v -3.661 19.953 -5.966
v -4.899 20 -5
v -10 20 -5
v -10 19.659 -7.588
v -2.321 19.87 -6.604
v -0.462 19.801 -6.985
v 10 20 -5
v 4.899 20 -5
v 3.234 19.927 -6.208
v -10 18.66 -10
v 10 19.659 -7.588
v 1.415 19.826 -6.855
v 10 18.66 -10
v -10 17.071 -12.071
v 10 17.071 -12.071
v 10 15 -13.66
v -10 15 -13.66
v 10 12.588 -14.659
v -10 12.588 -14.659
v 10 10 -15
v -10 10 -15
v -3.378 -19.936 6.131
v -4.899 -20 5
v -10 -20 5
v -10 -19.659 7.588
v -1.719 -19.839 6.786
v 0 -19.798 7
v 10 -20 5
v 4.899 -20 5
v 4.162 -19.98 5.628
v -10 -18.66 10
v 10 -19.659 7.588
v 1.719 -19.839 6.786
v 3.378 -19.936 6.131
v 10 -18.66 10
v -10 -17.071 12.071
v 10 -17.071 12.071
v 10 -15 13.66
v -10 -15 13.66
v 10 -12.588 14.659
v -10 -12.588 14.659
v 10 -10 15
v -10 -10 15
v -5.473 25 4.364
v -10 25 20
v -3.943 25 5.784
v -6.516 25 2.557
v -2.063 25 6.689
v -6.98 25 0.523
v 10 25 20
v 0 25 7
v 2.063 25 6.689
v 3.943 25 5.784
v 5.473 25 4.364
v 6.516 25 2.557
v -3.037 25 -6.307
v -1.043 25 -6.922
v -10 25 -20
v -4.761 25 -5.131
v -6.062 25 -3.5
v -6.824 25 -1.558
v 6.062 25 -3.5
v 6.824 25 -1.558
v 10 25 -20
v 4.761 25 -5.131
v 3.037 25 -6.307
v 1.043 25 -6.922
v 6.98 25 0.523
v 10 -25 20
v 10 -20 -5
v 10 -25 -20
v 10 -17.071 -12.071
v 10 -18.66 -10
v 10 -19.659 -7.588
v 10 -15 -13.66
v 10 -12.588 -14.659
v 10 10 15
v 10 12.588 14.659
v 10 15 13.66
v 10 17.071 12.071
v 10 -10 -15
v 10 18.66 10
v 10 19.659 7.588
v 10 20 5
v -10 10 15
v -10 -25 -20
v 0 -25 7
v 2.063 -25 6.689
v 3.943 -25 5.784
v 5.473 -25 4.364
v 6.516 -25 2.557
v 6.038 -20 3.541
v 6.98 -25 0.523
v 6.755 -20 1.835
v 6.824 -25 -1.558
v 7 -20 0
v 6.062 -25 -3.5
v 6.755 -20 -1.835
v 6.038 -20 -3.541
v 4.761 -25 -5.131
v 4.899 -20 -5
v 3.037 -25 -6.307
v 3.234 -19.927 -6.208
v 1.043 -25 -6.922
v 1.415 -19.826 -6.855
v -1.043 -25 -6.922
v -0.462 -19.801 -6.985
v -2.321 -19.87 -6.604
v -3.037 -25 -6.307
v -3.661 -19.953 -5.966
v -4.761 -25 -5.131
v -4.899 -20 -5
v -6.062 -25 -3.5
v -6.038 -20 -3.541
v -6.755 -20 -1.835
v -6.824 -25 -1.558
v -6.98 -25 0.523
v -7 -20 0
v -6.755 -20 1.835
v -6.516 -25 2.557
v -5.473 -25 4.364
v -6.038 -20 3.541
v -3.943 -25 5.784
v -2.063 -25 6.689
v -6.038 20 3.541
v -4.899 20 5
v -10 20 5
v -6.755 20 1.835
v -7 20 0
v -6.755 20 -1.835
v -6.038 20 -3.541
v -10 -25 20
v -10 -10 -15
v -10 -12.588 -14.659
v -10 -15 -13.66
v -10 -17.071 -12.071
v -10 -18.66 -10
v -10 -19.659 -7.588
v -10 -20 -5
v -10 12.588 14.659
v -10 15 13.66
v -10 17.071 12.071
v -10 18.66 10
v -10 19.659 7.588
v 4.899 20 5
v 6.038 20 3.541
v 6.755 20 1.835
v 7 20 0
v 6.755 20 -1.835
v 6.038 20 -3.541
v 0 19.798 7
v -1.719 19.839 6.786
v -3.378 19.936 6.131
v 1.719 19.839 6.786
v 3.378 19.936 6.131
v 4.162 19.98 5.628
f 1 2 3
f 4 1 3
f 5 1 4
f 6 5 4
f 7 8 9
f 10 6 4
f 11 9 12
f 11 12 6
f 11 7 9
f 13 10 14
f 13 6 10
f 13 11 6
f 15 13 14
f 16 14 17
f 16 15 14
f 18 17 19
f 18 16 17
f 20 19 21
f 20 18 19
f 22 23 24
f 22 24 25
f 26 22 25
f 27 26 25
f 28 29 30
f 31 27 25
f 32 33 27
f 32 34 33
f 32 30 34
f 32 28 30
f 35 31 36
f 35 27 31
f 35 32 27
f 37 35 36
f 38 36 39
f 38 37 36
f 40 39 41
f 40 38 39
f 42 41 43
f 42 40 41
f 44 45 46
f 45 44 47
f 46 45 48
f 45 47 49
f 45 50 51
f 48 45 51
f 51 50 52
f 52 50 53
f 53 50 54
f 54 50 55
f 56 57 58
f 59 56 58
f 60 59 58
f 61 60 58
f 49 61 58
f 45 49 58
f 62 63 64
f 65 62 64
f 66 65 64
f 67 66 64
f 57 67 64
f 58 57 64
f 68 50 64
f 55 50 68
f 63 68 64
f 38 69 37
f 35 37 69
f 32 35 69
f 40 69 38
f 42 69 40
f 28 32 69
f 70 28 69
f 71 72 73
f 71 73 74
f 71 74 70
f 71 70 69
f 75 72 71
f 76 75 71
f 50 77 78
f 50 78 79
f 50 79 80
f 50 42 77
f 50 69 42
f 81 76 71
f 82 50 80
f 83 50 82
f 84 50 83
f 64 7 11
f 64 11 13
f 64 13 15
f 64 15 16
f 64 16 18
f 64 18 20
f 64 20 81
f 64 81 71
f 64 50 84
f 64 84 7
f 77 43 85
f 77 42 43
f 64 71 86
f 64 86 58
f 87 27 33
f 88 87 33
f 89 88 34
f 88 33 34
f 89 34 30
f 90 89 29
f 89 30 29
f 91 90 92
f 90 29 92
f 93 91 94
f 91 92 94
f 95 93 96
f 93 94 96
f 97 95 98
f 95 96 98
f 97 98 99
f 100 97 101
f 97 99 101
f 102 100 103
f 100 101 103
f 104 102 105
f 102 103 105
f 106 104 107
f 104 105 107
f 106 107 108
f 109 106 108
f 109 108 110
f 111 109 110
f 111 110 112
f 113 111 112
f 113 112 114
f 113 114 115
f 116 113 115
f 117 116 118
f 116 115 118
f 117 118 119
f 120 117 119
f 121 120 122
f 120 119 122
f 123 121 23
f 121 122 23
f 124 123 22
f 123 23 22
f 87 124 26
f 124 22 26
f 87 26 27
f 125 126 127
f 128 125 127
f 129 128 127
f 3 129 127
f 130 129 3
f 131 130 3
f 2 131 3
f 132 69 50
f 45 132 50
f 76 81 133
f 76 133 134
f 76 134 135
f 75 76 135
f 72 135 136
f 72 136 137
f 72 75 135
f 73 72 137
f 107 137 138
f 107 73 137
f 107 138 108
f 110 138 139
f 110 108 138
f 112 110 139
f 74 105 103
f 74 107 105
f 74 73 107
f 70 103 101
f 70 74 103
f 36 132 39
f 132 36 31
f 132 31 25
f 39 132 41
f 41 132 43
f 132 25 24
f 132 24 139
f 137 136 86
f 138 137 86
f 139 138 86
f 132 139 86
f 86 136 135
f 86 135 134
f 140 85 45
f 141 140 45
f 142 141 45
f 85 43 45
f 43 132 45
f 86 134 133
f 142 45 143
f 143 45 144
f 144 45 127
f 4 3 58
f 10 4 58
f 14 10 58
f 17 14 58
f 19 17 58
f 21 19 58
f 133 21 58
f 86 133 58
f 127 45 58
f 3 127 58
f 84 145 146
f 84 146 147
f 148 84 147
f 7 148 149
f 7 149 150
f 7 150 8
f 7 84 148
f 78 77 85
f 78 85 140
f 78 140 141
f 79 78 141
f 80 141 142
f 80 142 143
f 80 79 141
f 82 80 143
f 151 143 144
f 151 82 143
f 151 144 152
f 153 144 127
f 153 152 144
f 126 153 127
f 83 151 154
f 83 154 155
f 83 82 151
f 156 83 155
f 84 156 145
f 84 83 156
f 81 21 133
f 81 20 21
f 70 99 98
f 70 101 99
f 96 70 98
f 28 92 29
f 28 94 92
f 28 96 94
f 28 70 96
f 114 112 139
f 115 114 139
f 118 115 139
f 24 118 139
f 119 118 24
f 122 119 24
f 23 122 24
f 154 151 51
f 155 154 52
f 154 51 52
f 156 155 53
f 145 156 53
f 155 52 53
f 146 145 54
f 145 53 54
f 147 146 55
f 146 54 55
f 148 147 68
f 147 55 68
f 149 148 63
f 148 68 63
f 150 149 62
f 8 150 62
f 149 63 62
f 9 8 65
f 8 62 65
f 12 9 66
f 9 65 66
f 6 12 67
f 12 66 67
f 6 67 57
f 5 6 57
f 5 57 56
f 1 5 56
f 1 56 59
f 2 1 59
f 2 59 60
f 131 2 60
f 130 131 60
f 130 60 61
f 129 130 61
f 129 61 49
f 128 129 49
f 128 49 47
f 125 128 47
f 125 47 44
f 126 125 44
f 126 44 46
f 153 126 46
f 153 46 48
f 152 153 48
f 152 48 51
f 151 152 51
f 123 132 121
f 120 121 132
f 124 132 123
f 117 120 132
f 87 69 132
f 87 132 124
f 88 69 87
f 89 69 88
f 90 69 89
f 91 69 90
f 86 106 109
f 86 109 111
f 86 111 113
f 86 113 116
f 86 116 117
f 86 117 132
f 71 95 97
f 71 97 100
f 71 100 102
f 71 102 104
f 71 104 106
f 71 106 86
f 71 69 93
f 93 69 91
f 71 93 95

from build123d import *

# Parameters (mm, degrees)
SKETCH1_W           = 40
SKETCH1_H           = 50
BOSS_EXTRUDE1_DEPTH = 10
SKETCH3_R           = 7
CUT_EXTRUDE1_DEPTH  = 55.772255751


with BuildPart() as part:
    # Sketch1 → Boss-Extrude1 (new, symmetric)
    with BuildSketch(Plane(origin=(0, 0, 0), x_dir=(0, 0, -1), z_dir=(1, 0, 0))):
        Rectangle(SKETCH1_W, SKETCH1_H)
        with BuildLine():
            Line((-5, 20), (5, 20))
            ThreePointArc((5, 20), (12.071067812, 17.071067812), (15, 10))
            Line((15, 10), (15, -10))
            ThreePointArc((15, -10), (12.071067812, -17.071067812), (5, -20))
            Line((5, -20), (-5, -20))
            ThreePointArc((-5, -20), (-12.071067812, -17.071067812), (-15, -10))
            Line((-15, -10), (-15, 10))
            ThreePointArc((-15, 10), (-12.071067812, 17.071067812), (-5, 20))
        make_face(mode=Mode.SUBTRACT)
    extrude(amount=BOSS_EXTRUDE1_DEPTH, both=True)

    # Sketch3 → Cut-Extrude1 (cut, through all)
    with BuildSketch(Plane(origin=(0, 25, 0), x_dir=(1, 0, 0), z_dir=(0, 1, 0))):
        with Locations(Location((0, 0, 0), (0, 0, 270))):
            Circle(SKETCH3_R)
    extrude(amount=-CUT_EXTRUDE1_DEPTH, mode=Mode.SUBTRACT)


solid = part.part
